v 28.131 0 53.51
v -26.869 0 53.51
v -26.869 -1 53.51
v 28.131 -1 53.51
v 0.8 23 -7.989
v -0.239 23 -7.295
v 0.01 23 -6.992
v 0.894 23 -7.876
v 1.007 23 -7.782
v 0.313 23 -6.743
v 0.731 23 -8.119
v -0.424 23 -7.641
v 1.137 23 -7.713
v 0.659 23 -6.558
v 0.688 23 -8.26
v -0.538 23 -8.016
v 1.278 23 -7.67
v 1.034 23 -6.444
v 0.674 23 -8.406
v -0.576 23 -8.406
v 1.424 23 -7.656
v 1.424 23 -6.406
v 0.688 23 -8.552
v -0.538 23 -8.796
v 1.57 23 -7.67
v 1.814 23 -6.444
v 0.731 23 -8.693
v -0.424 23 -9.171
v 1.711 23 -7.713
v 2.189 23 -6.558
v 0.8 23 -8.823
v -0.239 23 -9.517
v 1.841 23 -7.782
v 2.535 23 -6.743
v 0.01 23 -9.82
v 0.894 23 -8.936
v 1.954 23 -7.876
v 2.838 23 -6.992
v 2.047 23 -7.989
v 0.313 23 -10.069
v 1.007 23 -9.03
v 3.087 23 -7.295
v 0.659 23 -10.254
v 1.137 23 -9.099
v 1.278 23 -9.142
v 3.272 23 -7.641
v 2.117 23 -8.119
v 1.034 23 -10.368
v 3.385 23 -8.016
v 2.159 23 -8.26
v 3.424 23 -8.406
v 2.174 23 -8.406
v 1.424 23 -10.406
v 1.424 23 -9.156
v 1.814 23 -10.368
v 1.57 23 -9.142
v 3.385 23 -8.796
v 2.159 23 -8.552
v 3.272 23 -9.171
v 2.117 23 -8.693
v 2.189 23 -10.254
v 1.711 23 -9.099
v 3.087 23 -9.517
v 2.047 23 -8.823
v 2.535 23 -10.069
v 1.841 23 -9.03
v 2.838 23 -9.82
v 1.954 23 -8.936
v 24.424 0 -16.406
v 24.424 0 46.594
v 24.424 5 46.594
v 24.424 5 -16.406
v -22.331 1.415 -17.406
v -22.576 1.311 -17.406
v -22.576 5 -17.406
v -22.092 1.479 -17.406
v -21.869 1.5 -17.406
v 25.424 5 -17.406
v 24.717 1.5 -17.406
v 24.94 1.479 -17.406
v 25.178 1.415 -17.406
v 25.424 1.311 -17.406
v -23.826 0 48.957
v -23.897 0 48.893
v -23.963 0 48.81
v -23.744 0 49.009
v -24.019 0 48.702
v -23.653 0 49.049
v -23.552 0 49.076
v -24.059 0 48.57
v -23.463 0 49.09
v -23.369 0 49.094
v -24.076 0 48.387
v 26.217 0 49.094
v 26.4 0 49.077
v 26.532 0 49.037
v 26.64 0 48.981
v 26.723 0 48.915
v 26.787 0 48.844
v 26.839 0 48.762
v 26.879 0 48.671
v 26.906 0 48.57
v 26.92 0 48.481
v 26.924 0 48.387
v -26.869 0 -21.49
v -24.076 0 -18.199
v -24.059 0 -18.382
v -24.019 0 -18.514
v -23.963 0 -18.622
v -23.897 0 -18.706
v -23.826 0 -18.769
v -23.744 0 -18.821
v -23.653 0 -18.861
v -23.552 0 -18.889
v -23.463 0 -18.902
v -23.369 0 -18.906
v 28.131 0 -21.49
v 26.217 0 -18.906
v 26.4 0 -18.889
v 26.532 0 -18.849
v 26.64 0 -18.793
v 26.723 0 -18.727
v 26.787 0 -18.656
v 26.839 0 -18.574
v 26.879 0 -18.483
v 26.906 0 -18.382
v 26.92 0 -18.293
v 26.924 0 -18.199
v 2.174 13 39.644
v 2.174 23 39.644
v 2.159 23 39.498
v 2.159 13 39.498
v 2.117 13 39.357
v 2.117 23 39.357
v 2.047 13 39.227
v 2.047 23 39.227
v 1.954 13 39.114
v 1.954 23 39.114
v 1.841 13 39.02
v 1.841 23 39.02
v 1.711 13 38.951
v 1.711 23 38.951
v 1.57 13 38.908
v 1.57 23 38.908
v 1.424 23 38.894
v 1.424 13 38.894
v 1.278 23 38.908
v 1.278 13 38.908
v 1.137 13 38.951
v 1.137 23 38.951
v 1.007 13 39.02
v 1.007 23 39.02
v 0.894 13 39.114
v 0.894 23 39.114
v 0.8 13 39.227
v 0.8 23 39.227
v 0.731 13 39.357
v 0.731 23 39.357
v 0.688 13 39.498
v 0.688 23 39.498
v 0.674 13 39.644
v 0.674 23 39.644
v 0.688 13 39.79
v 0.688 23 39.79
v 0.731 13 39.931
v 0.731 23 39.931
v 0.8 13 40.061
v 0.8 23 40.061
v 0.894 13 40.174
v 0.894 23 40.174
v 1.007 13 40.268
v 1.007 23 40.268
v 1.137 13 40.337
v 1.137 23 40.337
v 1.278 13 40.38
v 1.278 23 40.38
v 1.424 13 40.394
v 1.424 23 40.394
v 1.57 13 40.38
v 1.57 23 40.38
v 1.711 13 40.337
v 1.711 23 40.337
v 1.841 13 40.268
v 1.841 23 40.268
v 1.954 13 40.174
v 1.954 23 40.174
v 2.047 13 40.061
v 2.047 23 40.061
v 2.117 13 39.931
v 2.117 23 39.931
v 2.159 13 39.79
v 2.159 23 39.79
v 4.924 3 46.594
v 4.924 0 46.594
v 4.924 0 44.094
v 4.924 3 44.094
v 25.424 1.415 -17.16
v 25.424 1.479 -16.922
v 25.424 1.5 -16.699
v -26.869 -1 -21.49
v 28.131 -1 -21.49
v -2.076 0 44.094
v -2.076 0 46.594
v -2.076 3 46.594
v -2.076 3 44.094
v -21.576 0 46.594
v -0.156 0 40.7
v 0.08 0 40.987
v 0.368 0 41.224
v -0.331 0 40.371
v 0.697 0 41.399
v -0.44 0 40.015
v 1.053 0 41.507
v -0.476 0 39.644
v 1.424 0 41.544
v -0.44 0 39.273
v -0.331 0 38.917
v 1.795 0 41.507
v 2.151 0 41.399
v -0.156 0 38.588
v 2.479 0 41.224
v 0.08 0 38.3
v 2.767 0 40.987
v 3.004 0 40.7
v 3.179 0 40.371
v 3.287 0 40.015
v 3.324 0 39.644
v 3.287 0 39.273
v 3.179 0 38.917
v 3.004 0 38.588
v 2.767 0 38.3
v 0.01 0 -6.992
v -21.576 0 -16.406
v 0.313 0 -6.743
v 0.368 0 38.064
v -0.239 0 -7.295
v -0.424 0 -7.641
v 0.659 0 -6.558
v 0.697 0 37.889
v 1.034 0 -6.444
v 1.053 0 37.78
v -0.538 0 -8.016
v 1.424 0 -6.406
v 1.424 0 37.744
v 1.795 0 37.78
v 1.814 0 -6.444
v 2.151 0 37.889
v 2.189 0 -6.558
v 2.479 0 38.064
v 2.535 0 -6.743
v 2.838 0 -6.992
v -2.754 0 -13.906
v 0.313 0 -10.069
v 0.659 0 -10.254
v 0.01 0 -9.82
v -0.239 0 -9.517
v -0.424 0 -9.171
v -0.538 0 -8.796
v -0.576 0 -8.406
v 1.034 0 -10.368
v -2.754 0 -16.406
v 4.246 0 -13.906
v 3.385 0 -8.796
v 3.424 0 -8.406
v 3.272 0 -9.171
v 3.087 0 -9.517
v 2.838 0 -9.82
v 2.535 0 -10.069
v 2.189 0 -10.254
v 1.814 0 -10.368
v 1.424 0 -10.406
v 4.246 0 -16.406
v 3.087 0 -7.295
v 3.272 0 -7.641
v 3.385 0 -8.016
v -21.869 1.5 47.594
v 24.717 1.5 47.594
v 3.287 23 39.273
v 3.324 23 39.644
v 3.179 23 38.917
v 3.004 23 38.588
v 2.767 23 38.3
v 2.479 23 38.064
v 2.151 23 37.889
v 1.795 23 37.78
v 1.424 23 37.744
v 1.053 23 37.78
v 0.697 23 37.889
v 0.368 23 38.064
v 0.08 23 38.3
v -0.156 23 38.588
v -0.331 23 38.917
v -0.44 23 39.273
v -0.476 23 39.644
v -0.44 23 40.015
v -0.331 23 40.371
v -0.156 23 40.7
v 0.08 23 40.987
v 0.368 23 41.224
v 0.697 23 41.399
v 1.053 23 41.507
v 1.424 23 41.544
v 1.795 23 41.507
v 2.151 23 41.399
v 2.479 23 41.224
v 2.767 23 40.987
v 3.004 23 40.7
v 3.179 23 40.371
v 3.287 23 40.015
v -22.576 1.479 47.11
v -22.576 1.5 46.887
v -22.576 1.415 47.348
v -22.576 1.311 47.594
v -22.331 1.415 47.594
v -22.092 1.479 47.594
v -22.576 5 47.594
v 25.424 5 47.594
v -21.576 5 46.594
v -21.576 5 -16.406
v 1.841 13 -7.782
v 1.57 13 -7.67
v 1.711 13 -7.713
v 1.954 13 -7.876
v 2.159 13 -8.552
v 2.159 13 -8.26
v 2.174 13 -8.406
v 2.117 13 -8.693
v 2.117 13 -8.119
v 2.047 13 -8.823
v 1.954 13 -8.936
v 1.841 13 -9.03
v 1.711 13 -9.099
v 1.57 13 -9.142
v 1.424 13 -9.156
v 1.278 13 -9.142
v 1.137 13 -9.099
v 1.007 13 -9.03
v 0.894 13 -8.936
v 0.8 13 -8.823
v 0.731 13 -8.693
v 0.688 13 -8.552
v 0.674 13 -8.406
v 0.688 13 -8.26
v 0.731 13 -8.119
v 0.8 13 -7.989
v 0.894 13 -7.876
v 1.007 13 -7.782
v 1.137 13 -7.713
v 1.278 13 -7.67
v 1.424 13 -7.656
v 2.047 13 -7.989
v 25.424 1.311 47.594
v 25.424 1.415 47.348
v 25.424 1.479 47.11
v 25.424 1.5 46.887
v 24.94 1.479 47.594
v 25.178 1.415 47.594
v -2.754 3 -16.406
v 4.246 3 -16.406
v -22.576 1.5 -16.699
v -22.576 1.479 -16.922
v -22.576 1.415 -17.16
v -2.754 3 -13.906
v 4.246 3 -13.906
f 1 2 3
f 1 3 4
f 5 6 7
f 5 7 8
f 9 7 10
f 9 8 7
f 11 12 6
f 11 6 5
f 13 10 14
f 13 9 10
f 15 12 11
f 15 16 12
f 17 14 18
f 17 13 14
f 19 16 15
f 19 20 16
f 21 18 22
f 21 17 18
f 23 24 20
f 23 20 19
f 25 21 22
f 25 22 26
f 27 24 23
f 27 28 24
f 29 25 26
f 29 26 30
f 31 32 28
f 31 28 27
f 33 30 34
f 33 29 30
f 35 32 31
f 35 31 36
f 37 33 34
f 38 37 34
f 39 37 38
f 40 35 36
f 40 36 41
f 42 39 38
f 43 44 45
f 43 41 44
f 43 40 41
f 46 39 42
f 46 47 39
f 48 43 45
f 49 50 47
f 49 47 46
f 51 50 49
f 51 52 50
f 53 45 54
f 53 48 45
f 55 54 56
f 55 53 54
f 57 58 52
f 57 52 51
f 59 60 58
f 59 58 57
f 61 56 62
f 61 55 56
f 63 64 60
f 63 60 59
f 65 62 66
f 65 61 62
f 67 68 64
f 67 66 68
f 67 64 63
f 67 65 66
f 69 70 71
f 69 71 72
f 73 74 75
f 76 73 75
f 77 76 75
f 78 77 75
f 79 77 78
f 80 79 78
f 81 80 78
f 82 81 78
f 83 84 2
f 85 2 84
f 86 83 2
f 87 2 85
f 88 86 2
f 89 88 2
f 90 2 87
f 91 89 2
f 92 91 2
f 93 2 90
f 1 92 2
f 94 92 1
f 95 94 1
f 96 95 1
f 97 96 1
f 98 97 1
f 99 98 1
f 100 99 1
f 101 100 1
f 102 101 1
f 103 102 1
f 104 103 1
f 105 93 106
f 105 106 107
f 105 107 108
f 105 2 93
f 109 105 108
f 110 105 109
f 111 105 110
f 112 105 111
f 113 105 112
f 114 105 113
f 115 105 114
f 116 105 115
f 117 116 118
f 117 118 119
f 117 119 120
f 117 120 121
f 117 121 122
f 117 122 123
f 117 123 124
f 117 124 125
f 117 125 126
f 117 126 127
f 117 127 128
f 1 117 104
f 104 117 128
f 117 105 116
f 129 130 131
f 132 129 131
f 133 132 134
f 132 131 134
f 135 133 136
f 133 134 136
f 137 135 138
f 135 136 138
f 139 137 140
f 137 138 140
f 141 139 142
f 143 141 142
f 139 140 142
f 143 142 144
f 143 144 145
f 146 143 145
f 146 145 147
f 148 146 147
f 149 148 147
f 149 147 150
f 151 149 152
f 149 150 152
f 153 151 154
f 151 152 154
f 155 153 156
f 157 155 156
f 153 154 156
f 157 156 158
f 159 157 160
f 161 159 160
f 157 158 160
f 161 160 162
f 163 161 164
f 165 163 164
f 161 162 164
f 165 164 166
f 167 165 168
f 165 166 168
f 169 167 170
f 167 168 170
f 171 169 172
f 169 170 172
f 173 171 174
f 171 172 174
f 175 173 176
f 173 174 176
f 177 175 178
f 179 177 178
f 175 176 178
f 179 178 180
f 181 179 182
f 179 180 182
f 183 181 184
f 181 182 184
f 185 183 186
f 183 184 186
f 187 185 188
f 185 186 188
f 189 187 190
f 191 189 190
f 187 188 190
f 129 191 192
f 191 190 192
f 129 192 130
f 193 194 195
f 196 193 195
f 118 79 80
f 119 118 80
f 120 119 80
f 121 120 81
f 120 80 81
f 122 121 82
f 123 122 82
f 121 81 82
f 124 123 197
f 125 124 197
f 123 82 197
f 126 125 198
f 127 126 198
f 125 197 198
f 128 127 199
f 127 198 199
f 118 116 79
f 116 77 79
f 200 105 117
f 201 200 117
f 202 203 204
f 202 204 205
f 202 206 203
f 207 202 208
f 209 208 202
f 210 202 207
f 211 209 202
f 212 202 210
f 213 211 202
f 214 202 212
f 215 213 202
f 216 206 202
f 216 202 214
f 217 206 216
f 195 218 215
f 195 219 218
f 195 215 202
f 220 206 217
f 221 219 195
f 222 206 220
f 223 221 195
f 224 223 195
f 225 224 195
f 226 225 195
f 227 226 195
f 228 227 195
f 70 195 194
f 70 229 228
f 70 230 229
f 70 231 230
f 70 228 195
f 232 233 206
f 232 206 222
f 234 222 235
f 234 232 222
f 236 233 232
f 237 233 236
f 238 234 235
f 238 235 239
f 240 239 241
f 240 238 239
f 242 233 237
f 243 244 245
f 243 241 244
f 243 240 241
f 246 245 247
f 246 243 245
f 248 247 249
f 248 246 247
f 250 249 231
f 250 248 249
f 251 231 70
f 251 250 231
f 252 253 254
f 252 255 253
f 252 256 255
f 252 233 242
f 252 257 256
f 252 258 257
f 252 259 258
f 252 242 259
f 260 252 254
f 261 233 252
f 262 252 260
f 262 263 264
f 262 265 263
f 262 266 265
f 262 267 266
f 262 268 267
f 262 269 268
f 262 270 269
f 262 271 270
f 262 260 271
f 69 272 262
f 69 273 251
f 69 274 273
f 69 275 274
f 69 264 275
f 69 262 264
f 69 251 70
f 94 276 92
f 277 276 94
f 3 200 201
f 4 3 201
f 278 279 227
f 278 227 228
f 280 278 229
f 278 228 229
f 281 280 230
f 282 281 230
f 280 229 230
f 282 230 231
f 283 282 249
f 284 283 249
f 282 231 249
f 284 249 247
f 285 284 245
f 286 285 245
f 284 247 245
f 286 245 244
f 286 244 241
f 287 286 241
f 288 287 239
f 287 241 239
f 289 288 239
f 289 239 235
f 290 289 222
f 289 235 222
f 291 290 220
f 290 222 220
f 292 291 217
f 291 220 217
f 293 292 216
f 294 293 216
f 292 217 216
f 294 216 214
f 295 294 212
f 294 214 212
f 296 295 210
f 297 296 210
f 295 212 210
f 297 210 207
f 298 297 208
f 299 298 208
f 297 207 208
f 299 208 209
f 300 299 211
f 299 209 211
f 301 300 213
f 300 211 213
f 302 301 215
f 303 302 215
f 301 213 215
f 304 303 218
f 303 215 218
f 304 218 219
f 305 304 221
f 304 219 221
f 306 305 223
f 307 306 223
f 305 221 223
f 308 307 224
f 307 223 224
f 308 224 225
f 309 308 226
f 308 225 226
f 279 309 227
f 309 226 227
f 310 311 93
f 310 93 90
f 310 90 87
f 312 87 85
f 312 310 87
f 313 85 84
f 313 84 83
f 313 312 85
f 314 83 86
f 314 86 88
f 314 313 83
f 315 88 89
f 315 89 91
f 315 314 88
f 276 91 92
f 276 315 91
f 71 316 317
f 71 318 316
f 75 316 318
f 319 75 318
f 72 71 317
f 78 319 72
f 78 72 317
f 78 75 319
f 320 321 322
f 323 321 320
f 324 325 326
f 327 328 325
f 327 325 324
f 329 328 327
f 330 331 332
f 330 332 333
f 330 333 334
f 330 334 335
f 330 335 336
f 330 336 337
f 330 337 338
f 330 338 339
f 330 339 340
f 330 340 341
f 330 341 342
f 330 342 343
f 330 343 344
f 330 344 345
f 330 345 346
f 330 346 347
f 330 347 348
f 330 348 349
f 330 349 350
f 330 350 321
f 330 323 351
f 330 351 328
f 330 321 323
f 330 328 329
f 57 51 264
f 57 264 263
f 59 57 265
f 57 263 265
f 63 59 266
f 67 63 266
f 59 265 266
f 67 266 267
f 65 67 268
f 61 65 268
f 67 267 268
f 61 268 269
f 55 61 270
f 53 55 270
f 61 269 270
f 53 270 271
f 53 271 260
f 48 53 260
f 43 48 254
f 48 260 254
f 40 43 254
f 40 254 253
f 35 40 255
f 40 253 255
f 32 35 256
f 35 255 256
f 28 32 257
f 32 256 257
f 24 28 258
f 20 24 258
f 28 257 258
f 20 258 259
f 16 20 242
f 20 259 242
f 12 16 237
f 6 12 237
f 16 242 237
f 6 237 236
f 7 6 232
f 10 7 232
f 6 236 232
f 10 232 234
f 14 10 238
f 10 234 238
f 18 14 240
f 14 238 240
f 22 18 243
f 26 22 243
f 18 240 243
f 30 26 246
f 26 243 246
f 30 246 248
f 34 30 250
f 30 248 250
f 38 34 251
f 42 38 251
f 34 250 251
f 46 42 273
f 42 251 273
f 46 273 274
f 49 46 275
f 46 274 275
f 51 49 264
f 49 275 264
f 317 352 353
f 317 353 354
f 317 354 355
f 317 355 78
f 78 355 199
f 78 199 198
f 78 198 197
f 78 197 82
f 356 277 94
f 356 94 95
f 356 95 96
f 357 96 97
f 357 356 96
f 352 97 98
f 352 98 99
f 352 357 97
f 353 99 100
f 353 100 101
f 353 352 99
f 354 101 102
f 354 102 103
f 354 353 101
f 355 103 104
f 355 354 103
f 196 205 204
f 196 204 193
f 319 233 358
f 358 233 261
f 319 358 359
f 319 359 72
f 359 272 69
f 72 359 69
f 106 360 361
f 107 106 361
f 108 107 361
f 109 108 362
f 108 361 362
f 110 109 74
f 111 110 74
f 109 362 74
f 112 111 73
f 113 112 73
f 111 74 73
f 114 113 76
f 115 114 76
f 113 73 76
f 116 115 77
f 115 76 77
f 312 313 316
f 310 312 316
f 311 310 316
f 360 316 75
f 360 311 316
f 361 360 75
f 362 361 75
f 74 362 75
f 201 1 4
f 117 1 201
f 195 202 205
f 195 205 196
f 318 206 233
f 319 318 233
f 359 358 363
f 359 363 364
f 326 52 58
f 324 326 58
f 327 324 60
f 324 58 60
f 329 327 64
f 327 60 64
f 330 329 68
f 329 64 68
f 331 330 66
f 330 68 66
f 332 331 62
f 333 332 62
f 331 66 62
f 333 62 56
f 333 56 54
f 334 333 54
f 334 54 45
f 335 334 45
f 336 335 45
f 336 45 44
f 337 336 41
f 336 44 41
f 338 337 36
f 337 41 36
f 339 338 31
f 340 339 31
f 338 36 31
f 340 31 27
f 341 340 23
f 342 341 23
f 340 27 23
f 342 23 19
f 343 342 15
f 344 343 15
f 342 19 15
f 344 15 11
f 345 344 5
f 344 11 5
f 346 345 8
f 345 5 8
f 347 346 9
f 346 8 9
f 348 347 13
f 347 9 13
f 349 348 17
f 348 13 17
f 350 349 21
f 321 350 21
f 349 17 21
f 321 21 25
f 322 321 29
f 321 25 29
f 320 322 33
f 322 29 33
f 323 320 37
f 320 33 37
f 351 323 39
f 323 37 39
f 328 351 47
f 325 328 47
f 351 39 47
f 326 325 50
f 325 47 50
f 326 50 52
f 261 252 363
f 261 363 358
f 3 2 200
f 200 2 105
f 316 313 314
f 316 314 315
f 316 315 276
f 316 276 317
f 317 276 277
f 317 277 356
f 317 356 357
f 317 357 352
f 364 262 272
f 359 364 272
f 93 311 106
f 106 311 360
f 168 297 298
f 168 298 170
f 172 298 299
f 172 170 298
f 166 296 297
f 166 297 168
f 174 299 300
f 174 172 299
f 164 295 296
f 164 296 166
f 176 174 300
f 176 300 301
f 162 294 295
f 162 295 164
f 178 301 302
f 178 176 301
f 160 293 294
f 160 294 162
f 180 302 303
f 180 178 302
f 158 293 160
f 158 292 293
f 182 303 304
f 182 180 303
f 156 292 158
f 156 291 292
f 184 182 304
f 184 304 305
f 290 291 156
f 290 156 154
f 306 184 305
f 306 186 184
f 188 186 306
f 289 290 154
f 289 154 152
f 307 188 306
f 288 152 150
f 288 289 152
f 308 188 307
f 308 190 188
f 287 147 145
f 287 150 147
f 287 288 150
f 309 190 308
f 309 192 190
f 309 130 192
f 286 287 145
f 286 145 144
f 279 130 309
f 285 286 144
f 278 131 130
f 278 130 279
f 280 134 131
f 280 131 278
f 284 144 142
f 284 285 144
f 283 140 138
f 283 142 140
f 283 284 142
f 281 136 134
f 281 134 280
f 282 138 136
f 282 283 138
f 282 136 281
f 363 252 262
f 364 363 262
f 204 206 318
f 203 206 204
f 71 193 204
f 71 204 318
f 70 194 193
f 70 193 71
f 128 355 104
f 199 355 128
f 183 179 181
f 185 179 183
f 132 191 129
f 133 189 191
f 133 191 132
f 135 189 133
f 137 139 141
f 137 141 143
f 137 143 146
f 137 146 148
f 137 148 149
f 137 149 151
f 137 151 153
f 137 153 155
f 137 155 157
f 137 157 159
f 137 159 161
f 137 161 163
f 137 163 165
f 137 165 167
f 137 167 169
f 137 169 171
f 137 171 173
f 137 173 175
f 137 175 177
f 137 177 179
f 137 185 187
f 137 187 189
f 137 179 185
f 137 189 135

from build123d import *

# Parameters (mm, degrees)
SKETCH_1_W          = 55
SKETCH_1_H          = 75
EXTRUDE_1_DEPTH     = 1
SKETCH_3_W          = 48
SKETCH_3_H          = 65
SKETCH_3_W_2        = 46
SKETCH_3_H_2        = 63
EXTRUDE_2_DEPTH     = 5
SKETCH_4_W          = 7
SKETCH_4_H          = 2.5
EXTRUDE_3_DEPTH     = 3
SKETCH_5_R          = 1.9
EXTRUDE_4_DEPTH     = 23
SKETCH_6_R          = 0.75
CUT_EXTRUDE_1_DEPTH = 10
SKETCH_7_R          = 2
EXTRUDE_5_DEPTH     = 23
SKETCH_8_R          = 0.75
CUT_EXTRUDE_2_DEPTH = 10
CHAMFER_1_SIZE      = 1.5
FILLET_2_R          = 1


with BuildPart() as part:
    # Эскиз1 → Бобышка-Вытянуть1 (new body)
    with BuildSketch(Plane(origin=(0, 0, 0), x_dir=(1, 0, 0), z_dir=(0, 1, 0))):
        with Locations((0.630718954, -16.009803922)):
            Rectangle(SKETCH_1_W, SKETCH_1_H)
    extrude(amount=-EXTRUDE_1_DEPTH)

    # Эскиз3 → Бобышка-Вытянуть2 (add)
    with BuildSketch(Plane(origin=(0, 0, 0), x_dir=(1, 0, 0), z_dir=(0, 1, 0))):
        with Locations((1.423879909, -15.093947699)):
            Rectangle(SKETCH_3_W, SKETCH_3_H)
        with Locations((1.423879909, -15.093947699)):
            Rectangle(SKETCH_3_W_2, SKETCH_3_H_2, mode=Mode.SUBTRACT)
    extrude(amount=EXTRUDE_2_DEPTH)

    # Эскиз4 → Бобышка-Вытянуть3 (add)
    with BuildSketch(Plane(origin=(0, 0, 0), x_dir=(1, 0, 0), z_dir=(0, 1, 0))):
        with Locations((1.423879909, -45.343947699)):
            Rectangle(SKETCH_4_W, SKETCH_4_H)
        with Locations((0.74590962, 15.156052301)):
            Rectangle(SKETCH_4_W, SKETCH_4_H)
    extrude(amount=EXTRUDE_3_DEPTH)

    # Эскиз5 → Бобышка-Вытянуть4 (add)
    with BuildSketch(Plane(origin=(0, 0, 0), x_dir=(1, 0, 0), z_dir=(0, 1, 0))):
        with Locations((1.423879909, -39.643947699)):
            Circle(SKETCH_5_R)
    extrude(amount=EXTRUDE_4_DEPTH)

    # Эскиз6 → Вырез-Вытянуть1 (cut)
    with BuildSketch(Plane(origin=(0, 23, 0), x_dir=(1, 0, 0), z_dir=(0, 1, 0))):
        with Locations((1.423879909, -39.643947699)):
            Circle(SKETCH_6_R)
    extrude(amount=-CUT_EXTRUDE_1_DEPTH, mode=Mode.SUBTRACT)

    # Эскиз7 → Бобышка-Вытянуть5 (add)
    with BuildSketch(Plane(origin=(0, 0, 0), x_dir=(1, 0, 0), z_dir=(0, 1, 0))):
        with Locations((1.423879909, 8.406052301)):
            Circle(SKETCH_7_R)
    extrude(amount=EXTRUDE_5_DEPTH)

    # Эскиз8 → Вырез-Вытянуть2 (cut)
    with BuildSketch(Plane(origin=(0, 23, 0), x_dir=(1, 0, 0), z_dir=(0, 1, 0))):
        with Locations((1.423879909, 8.406052301)):
            Circle(SKETCH_8_R)
    extrude(amount=-CUT_EXTRUDE_2_DEPTH, mode=Mode.SUBTRACT)

    # Фаска1
    chamfer_1_edges = [part.edges().sort_by_distance(p)[0] for p in [
        (-22.576120091, 0, 15.093947699),
        (1.423879909, 0, 47.593947699),
        (25.423879909, 0, 15.093947699),
        (1.423879909, 0, -17.406052301),
    ]]
    chamfer(chamfer_1_edges, length=CHAMFER_1_SIZE)

    # Скругление2
    fillet_2_edges = [part.edges().sort_by_distance(p)[0] for p in [
        (-23.326120091, 0.75, -18.156052301),
        (26.173879909, 0.75, -18.156052301),
        (-23.326120091, 0.75, 48.343947699),
        (26.173879909, 0.75, 48.343947699),
    ]]
    fillet(fillet_2_edges, radius=FILLET_2_R)


solid = part.part
